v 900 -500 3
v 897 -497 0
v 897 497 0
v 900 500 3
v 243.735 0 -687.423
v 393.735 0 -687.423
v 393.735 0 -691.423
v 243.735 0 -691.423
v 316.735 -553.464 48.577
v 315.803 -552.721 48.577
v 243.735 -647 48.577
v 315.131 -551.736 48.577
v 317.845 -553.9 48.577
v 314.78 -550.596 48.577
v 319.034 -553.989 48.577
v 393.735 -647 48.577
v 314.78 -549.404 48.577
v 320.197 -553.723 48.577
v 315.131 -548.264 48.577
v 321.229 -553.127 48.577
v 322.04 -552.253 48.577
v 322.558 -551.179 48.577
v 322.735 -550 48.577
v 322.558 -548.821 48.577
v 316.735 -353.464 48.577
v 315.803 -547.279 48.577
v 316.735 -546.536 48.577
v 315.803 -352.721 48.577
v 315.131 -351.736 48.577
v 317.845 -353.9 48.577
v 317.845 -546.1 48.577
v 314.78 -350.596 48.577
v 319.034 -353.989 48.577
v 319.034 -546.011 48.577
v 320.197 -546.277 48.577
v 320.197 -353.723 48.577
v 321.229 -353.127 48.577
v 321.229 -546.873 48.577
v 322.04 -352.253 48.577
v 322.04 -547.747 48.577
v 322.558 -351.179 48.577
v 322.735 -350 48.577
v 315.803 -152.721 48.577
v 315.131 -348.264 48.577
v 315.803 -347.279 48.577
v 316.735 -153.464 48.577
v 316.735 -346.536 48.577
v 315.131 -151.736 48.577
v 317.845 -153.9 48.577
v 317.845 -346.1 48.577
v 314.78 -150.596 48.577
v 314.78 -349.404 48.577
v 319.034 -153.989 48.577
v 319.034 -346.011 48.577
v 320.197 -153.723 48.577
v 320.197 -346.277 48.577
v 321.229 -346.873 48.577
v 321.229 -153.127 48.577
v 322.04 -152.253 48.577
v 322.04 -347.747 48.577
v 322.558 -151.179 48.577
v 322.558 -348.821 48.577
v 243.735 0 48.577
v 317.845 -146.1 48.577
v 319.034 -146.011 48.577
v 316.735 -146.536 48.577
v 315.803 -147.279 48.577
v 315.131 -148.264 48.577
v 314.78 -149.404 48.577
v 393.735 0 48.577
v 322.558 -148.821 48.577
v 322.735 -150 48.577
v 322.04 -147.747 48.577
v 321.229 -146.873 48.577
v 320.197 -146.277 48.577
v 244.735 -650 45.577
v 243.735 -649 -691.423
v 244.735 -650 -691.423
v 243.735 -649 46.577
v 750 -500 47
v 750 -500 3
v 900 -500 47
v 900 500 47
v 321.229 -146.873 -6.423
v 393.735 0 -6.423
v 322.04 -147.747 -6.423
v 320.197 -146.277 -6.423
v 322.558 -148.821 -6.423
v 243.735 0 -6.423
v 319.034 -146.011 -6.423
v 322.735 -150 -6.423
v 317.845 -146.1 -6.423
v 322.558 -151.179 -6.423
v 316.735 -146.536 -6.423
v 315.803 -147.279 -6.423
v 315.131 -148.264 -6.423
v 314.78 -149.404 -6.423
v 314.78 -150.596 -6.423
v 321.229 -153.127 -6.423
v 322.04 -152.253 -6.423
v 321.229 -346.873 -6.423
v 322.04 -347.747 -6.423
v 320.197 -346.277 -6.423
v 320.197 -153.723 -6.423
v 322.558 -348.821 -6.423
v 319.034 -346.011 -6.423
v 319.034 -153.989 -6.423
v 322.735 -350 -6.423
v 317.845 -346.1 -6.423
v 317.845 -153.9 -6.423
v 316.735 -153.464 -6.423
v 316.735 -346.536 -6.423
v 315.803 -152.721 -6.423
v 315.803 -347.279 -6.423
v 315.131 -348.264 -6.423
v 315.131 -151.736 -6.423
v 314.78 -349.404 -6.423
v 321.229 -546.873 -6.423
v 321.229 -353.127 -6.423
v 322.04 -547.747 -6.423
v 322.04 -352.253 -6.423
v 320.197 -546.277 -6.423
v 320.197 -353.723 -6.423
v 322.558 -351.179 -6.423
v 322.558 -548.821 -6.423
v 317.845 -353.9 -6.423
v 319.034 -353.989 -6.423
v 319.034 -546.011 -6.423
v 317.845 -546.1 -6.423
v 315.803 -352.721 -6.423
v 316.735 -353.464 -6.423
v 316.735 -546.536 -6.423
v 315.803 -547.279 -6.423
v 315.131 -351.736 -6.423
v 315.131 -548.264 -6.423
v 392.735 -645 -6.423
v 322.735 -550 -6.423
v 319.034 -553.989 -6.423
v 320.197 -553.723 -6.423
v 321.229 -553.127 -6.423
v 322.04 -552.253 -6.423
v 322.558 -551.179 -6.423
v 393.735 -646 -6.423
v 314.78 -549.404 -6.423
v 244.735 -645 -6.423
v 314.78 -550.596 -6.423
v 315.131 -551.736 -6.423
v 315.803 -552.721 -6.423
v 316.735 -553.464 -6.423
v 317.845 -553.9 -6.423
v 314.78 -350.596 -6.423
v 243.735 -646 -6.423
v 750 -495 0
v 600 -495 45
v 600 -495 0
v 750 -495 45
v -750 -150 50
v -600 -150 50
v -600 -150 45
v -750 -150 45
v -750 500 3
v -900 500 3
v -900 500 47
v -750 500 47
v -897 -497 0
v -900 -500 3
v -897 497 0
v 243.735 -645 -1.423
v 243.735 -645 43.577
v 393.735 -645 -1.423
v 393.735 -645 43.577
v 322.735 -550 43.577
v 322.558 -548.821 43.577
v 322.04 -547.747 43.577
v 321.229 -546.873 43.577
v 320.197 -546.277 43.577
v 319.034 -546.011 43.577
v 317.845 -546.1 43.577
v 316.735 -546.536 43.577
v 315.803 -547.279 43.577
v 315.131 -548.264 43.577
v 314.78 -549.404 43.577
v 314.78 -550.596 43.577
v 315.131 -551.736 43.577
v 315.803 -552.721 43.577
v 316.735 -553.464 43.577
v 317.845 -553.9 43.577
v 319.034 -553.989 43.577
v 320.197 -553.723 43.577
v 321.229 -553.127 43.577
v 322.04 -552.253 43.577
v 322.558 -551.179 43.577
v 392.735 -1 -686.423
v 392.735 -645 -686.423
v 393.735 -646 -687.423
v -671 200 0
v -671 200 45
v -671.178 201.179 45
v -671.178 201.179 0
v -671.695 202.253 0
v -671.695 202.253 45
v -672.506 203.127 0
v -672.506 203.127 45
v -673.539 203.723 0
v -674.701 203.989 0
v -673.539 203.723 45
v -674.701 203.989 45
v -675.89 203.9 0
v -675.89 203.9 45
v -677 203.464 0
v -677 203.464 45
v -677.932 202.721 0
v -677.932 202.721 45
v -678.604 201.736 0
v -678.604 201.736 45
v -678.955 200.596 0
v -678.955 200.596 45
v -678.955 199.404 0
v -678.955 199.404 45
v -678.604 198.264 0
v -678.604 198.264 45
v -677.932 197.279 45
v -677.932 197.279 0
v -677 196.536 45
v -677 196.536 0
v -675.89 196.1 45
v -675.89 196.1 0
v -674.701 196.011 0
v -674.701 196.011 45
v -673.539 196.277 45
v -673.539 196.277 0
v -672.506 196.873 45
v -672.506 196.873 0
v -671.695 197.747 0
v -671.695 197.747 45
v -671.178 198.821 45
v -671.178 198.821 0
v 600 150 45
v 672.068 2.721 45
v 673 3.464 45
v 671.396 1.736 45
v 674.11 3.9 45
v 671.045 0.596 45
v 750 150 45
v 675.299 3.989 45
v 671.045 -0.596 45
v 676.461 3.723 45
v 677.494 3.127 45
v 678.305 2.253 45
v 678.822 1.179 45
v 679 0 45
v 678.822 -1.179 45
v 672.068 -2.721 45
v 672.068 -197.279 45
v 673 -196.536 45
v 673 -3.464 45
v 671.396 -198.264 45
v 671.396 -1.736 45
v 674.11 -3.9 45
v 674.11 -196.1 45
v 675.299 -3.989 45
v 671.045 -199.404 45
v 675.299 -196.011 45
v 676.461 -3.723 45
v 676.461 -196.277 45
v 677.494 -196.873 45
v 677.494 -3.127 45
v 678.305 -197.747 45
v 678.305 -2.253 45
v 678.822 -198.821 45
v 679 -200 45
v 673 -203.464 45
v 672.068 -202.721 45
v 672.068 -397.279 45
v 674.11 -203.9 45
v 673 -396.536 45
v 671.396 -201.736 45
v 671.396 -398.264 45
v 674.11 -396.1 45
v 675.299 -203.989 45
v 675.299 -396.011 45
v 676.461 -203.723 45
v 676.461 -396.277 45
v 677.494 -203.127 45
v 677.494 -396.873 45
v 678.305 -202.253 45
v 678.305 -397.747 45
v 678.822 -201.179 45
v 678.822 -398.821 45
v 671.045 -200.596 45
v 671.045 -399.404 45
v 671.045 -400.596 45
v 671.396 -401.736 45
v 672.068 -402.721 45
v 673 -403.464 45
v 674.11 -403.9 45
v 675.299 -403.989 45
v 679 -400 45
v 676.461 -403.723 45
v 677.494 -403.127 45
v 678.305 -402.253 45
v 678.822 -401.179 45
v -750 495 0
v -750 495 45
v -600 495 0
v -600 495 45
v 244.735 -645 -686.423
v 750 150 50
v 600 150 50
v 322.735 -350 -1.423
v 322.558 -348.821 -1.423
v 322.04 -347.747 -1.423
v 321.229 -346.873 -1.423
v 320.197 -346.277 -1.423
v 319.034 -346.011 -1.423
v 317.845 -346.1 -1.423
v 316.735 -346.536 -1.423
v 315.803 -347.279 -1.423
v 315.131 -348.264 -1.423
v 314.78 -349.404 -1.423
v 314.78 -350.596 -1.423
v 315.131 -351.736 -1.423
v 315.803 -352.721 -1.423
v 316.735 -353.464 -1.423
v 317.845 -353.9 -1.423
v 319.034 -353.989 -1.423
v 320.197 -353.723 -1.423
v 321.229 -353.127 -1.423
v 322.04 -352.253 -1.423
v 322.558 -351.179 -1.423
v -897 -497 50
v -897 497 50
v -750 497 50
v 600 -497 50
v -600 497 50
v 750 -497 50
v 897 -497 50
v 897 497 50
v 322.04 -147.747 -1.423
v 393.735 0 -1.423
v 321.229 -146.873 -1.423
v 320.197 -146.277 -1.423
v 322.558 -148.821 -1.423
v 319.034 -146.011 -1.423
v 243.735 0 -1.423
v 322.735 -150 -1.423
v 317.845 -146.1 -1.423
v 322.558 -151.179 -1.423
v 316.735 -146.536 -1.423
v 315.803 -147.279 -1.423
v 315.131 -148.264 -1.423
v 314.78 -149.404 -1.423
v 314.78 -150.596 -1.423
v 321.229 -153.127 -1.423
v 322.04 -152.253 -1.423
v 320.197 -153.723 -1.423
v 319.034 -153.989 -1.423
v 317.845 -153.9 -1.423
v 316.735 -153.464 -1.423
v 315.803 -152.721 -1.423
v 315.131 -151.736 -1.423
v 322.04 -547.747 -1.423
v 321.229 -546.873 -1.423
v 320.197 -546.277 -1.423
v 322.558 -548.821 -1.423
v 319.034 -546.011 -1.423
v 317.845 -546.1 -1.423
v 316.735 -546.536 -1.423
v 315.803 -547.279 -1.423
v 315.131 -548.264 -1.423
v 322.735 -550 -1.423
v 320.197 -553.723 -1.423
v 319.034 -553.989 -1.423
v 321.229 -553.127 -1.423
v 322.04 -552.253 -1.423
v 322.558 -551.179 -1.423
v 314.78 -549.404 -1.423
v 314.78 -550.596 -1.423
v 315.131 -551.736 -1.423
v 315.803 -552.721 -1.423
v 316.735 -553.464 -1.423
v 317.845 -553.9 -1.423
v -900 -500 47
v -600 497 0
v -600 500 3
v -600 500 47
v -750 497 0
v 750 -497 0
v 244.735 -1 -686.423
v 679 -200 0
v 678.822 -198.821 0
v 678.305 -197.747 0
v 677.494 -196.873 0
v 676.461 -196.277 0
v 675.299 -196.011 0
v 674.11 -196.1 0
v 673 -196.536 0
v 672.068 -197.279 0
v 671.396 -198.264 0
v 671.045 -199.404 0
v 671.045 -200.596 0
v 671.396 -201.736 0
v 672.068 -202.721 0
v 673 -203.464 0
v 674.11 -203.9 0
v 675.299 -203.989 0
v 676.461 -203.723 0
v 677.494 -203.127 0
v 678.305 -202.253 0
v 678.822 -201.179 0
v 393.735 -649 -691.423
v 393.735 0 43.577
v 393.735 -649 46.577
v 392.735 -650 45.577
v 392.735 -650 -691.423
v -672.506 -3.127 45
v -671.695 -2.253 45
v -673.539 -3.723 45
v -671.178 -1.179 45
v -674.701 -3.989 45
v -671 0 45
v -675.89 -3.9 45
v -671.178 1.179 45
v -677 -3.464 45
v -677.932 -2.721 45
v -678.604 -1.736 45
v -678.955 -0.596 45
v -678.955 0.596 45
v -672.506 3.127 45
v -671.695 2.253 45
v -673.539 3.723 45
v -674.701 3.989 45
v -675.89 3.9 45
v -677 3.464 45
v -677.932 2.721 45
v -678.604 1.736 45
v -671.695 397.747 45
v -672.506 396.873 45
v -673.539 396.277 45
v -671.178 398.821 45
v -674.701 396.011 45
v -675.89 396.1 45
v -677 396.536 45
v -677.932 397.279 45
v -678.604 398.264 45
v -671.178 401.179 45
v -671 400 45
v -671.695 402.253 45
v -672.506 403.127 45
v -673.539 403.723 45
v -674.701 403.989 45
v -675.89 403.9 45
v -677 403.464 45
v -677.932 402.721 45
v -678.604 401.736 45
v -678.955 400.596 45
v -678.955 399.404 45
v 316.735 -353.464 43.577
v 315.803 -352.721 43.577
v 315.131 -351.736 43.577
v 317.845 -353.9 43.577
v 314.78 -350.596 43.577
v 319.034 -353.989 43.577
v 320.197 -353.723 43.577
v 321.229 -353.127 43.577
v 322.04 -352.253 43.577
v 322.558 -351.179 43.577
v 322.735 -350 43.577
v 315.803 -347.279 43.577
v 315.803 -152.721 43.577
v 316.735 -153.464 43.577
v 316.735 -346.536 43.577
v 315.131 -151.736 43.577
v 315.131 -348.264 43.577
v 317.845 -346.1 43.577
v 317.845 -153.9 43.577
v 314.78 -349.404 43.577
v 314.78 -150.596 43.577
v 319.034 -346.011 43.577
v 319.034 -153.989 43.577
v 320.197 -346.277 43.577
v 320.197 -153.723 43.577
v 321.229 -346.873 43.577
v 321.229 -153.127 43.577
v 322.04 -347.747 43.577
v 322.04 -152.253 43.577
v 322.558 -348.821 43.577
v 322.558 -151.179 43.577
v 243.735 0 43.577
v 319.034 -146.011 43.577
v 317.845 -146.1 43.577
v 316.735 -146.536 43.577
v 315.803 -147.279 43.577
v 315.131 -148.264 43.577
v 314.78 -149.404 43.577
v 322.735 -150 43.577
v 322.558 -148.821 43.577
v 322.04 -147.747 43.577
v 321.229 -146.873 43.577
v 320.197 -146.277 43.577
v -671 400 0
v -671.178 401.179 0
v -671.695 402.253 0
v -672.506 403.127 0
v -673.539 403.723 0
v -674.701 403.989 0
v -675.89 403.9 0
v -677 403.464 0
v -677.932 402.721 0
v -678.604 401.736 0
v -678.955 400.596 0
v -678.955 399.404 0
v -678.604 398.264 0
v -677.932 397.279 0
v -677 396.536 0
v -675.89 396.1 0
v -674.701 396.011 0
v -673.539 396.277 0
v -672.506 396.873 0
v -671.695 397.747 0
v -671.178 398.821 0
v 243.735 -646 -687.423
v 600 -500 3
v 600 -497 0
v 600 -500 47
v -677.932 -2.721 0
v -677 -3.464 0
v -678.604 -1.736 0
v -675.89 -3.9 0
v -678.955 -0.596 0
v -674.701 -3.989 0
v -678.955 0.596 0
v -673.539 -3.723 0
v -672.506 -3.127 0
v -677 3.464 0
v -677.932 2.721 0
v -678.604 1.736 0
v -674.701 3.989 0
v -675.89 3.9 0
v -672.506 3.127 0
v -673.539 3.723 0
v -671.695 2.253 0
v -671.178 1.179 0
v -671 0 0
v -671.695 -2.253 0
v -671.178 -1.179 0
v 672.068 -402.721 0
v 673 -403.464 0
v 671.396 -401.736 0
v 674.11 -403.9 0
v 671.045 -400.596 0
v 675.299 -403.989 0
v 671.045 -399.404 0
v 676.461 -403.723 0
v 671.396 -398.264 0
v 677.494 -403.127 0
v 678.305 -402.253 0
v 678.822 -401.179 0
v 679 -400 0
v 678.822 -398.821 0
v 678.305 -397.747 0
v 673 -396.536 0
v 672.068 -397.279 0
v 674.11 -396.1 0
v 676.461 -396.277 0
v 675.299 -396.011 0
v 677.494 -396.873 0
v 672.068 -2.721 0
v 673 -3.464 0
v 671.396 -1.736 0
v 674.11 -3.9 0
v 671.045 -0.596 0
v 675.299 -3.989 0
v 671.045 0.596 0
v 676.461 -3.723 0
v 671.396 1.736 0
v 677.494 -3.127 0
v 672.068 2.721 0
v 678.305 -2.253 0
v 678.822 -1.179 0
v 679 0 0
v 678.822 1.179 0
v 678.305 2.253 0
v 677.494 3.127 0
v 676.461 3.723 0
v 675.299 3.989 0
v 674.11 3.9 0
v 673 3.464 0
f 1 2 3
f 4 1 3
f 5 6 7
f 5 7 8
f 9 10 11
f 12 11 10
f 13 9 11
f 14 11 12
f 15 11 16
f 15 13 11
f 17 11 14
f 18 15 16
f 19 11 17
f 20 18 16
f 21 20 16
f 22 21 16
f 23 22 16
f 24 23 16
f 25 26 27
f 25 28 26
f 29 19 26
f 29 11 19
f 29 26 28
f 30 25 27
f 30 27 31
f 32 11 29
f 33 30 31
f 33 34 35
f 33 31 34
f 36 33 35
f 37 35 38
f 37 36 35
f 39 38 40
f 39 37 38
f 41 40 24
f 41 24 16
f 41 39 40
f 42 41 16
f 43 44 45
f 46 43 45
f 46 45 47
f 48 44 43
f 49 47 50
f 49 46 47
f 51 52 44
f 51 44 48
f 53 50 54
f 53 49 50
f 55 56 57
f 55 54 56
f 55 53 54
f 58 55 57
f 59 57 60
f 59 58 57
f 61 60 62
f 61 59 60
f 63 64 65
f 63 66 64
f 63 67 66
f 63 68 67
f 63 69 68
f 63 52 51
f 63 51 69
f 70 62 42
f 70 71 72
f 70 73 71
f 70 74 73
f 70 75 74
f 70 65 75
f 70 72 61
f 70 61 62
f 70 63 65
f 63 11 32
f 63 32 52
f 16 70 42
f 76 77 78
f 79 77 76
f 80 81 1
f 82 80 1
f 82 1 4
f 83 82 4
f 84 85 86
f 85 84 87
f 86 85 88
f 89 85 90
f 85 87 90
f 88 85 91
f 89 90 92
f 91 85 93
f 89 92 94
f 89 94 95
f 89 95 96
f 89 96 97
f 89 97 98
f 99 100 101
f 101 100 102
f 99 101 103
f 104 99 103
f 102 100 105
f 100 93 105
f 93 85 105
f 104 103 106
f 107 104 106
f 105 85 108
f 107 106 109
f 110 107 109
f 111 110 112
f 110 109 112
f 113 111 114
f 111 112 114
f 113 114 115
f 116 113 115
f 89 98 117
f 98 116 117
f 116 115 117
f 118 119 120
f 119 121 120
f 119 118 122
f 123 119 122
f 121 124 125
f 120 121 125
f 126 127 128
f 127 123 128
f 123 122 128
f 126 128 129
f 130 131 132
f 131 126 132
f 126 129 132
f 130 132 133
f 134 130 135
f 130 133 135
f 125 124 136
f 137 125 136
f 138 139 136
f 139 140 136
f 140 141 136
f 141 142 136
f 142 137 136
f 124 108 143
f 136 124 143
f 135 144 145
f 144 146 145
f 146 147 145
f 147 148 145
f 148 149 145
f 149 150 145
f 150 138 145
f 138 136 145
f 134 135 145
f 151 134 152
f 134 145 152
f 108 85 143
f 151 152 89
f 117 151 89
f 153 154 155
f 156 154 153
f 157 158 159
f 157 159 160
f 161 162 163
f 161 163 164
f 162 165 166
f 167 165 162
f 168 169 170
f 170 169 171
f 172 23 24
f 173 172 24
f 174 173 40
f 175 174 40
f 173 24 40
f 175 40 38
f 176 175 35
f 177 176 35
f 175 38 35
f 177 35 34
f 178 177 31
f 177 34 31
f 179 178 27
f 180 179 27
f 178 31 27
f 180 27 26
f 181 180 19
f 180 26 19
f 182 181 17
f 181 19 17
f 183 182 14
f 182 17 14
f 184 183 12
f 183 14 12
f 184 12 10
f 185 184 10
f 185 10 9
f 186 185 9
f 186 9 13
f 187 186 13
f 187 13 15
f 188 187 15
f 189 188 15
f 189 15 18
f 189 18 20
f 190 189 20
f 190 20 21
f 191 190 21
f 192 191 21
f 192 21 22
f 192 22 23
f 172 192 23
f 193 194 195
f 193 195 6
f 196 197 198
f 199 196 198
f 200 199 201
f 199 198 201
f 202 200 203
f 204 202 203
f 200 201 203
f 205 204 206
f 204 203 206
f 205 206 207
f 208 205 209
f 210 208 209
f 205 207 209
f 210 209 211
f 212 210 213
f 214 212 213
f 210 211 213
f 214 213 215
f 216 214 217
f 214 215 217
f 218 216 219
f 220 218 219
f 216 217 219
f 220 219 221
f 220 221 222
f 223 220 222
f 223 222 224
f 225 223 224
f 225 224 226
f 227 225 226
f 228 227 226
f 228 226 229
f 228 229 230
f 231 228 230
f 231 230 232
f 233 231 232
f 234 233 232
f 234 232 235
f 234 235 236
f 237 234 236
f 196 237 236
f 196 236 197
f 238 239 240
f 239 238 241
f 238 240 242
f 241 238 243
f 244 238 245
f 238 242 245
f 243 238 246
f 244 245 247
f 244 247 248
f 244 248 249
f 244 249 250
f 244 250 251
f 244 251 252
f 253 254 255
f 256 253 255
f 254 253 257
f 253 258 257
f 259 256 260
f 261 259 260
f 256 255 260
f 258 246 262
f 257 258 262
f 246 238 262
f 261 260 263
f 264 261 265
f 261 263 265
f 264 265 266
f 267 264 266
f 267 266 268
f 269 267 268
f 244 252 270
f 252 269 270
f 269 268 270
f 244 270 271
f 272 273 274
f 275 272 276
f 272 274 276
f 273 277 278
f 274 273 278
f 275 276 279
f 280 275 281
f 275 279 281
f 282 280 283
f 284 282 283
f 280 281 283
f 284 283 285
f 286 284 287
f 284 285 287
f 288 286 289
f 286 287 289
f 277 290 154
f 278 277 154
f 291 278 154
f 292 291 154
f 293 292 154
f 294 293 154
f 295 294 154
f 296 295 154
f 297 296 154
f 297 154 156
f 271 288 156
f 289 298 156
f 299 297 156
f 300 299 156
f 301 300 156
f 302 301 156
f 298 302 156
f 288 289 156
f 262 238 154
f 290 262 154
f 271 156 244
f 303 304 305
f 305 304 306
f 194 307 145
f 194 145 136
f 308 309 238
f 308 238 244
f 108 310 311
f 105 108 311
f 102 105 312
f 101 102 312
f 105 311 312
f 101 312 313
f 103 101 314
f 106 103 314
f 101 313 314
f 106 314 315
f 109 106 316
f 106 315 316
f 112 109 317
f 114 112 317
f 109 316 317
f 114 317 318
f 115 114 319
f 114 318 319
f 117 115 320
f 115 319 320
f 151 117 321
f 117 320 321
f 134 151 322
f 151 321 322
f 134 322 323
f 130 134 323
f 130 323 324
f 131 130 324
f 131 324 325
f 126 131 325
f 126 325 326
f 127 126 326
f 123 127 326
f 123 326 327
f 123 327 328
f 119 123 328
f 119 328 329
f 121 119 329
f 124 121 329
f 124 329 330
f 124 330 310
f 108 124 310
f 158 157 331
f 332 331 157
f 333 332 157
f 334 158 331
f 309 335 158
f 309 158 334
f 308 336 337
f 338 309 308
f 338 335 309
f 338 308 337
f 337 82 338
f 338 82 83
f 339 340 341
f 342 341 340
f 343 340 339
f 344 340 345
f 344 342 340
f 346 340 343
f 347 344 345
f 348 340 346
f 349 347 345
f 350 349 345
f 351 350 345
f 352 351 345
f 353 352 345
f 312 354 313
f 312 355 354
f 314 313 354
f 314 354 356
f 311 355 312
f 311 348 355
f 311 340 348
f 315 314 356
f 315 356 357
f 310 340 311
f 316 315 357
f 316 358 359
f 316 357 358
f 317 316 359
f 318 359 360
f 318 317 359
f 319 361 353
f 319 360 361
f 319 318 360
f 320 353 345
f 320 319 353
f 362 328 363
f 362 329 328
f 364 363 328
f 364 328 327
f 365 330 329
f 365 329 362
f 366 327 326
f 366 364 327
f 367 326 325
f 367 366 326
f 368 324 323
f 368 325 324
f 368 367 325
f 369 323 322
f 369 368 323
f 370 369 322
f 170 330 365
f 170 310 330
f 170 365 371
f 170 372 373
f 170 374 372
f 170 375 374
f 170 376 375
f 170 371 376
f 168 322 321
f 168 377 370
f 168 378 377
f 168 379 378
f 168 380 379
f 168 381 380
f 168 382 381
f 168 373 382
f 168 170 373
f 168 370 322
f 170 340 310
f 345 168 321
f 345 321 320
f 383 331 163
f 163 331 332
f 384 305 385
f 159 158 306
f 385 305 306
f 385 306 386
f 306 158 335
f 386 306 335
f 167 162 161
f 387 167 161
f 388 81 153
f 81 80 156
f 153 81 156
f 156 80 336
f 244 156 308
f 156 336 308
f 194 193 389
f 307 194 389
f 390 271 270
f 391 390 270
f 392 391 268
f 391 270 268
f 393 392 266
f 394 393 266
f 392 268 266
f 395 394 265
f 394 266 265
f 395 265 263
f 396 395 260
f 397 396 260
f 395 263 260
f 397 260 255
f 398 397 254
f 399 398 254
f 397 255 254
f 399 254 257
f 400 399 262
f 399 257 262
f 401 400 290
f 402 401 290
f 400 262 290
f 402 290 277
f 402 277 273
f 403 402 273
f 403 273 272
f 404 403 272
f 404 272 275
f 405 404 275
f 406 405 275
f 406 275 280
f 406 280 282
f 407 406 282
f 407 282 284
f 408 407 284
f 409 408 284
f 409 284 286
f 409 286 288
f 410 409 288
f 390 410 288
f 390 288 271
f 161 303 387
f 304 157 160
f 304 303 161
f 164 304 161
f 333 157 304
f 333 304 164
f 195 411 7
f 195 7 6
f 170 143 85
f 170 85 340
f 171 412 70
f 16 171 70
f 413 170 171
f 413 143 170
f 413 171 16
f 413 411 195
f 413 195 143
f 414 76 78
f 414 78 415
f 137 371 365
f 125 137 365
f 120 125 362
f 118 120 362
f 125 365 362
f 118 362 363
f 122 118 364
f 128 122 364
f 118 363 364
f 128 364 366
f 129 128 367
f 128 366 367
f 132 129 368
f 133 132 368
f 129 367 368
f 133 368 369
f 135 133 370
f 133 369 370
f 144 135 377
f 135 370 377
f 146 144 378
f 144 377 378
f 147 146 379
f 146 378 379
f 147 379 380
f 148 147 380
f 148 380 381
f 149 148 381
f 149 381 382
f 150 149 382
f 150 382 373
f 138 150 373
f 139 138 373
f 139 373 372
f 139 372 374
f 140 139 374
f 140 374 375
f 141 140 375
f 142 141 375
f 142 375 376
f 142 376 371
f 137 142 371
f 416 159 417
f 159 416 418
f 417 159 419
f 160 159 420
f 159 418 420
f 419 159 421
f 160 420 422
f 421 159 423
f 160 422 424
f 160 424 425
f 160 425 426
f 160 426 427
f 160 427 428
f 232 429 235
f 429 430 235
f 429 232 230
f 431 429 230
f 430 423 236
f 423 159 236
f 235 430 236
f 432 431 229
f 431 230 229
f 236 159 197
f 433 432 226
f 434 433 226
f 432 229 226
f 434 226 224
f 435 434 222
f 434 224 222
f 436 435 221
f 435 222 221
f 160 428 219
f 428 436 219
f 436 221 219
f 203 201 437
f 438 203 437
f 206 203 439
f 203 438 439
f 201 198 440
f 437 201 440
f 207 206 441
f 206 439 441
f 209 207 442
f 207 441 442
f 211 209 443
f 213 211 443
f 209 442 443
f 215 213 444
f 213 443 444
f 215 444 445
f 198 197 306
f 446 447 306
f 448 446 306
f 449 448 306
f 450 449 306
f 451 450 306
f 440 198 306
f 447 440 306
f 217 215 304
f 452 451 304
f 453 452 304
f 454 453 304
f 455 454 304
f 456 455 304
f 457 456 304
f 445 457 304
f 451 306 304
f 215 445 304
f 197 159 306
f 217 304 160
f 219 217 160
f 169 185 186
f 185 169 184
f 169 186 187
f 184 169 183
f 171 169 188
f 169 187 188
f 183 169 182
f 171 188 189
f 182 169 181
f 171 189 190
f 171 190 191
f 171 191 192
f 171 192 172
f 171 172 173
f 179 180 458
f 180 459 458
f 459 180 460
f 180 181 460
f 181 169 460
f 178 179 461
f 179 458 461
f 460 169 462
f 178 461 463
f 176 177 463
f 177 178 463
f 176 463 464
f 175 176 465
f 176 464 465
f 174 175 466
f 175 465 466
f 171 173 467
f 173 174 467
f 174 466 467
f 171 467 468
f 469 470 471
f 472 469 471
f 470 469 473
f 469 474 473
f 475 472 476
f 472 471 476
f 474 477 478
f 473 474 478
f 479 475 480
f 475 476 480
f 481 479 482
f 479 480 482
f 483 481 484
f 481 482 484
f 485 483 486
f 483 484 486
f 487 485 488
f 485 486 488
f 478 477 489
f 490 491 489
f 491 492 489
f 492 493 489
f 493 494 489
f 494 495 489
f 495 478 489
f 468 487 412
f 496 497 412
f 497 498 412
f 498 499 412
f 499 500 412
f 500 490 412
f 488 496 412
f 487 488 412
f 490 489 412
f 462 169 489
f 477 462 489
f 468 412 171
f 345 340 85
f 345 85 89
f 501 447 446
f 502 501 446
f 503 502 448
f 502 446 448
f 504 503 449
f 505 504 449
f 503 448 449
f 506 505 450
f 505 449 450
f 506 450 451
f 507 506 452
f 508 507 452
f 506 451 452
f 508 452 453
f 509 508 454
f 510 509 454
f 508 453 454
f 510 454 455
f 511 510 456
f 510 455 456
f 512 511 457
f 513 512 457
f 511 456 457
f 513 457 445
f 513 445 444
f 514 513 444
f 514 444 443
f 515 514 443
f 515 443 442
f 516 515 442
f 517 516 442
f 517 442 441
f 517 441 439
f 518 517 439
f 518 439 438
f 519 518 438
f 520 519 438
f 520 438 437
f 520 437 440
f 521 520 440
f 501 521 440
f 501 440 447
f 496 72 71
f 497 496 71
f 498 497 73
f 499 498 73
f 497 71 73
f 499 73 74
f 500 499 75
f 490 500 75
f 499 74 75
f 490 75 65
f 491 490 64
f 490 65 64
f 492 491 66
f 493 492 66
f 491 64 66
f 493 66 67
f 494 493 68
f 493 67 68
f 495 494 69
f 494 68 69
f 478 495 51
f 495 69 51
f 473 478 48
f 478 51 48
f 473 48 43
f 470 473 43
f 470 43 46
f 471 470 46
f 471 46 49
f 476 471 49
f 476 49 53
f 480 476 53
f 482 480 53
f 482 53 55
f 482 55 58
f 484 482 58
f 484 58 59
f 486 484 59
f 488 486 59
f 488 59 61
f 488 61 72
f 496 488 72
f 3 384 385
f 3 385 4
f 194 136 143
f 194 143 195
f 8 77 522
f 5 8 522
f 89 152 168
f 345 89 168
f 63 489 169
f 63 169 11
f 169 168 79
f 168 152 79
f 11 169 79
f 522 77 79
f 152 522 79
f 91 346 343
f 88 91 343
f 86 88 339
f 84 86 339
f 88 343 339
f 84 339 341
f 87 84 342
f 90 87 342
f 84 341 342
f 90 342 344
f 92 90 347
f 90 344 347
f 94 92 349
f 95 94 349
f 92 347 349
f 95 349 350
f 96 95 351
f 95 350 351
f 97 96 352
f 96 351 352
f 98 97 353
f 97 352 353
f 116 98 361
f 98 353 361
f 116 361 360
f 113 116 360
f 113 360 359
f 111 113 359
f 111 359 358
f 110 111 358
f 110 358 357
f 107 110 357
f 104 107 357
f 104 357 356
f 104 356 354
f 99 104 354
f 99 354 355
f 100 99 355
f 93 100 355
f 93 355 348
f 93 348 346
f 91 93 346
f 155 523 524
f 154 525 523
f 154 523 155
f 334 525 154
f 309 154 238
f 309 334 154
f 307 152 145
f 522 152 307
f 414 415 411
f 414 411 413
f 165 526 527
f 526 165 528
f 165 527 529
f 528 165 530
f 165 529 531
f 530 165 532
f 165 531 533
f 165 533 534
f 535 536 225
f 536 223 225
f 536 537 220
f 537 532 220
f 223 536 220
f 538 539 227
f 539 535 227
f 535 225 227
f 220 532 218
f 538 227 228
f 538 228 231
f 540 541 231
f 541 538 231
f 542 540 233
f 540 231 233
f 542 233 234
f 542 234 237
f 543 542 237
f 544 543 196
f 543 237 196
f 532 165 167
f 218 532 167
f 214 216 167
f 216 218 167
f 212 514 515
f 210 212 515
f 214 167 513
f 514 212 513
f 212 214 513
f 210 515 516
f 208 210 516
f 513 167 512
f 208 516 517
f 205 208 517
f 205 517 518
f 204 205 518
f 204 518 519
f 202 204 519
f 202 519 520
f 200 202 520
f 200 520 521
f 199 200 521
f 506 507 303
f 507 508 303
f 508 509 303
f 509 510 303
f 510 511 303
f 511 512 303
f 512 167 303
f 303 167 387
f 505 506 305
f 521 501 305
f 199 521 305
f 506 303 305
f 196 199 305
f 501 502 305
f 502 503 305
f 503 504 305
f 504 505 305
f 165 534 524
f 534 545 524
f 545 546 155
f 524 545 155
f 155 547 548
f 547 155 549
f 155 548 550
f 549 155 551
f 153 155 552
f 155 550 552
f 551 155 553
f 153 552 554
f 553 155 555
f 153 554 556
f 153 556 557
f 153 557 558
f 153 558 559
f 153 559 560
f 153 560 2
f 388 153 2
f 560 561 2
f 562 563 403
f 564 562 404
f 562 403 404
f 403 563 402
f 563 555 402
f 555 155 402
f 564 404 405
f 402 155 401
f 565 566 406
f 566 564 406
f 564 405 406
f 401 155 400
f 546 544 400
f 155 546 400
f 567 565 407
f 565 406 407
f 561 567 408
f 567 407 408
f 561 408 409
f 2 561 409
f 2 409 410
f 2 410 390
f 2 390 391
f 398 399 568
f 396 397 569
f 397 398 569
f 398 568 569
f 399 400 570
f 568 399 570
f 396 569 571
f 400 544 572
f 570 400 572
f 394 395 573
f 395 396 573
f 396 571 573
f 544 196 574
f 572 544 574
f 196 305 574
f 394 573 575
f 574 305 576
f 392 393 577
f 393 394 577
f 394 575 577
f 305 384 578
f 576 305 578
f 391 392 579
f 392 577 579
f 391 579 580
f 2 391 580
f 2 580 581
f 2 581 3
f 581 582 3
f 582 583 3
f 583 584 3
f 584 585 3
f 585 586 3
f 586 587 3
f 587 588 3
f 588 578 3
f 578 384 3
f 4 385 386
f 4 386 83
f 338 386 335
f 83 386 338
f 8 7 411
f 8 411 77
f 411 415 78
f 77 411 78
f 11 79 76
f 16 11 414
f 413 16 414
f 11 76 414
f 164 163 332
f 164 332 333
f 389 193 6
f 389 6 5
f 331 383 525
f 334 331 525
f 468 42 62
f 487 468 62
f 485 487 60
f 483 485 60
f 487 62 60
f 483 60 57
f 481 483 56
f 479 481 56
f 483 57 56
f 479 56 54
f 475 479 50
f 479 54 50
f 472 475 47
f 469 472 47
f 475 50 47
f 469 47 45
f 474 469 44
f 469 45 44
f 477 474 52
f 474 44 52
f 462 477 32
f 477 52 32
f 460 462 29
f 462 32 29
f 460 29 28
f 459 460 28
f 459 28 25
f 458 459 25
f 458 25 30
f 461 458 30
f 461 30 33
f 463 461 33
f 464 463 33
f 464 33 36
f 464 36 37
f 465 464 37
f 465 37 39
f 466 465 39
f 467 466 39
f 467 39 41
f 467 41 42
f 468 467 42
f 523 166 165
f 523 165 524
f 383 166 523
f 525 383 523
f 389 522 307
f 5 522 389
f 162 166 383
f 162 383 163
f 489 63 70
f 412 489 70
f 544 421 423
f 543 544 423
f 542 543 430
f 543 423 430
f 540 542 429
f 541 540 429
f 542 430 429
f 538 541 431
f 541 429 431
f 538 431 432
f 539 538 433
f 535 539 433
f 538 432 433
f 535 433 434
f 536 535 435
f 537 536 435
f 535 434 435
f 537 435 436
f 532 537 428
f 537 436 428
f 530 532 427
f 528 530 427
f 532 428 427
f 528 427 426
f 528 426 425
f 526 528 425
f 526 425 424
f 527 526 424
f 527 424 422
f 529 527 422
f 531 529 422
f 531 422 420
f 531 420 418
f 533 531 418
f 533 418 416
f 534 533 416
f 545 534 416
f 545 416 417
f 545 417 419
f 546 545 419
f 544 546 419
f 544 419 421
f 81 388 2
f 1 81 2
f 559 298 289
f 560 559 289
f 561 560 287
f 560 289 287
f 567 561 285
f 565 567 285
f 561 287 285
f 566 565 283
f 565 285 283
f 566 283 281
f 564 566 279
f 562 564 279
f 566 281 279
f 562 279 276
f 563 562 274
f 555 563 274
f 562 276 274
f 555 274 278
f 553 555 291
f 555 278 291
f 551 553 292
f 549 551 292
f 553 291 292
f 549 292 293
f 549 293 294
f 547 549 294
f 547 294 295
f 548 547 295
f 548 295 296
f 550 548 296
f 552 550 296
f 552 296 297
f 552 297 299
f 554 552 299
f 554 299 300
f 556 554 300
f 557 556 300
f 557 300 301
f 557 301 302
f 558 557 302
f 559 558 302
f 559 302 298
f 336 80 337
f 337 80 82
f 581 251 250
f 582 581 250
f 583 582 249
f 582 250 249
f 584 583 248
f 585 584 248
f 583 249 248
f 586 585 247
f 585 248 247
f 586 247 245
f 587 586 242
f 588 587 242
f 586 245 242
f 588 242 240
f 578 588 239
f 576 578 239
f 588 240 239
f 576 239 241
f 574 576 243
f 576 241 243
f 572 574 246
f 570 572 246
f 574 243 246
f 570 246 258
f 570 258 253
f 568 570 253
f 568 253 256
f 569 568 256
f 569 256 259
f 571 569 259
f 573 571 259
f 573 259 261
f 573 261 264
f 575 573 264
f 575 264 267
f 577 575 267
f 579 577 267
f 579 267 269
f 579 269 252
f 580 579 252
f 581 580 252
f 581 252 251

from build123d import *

# Parameters (mm, degrees)
F0_W      = 1800
F0_H      = 1000
F1_DEPTH  = 50
F2_W      = 150
F2_H      = 10
F3_DEPTH  = 650
F4_W      = 150
F4_H      = 5
F5_DEPTH  = 650
F6_R      = 4
F7_DEPTH  = 50
F8_W      = 150
F8_H      = 5
F9_DEPTH  = 650
F10_W     = 150
F10_H     = 5
F11_DEPTH = 735
F12_W     = 150
F12_H     = 5
F13_DEPTH = 645
F14_W     = 150
F14_H     = 5
F15_DEPTH = 645
F16_R     = 4
F17_DEPTH = 80
F18_W     = 150
F18_H     = 5
F19_DEPTH = 100
F20_W     = 150
F20_H     = 5
F21_DEPTH = 100
F22_SIZE  = 3
F23_SIZE  = 3
F24_SIZE  = 1


with BuildPart() as f1:
    # F0 (on Top) → F1 (new body)
    with BuildSketch(Plane.XY):
        Rectangle(F0_W, F0_H)
    extrude(amount=F1_DEPTH)

    # F2 (on face) → F3 (cut)
    with BuildSketch(Plane.XZ.offset(500)):
        with Locations((675, 50)):
            Rectangle(F2_W, F2_H)
    extrude(amount=-F3_DEPTH, mode=Mode.SUBTRACT)

    # F4 (on face) → F5 (cut)
    with BuildSketch(Plane(origin=(0, 500, 0), x_dir=(-1, 0, 0), z_dir=(0, 1, 0))):
        with Locations((675, 47.5)):
            Rectangle(F4_W, F4_H)
    extrude(amount=-F5_DEPTH, mode=Mode.SUBTRACT)

    # F6 (on face) → F7 (cut)
    with BuildSketch(Plane.XY.offset(45)):
        with Locations((675, 0)):
            Circle(F6_R)
        with Locations((675, -200)):
            Circle(F6_R)
        with Locations((675, -400)):
            Circle(F6_R)
        with Locations((-675, 400)):
            Circle(F6_R)
        with Locations((-675, 200)):
            Circle(F6_R)
        with Locations((-675, 0)):
            Circle(F6_R)
    extrude(amount=-F7_DEPTH, mode=Mode.SUBTRACT)

    # F18 (on face) → F19 (cut)
    with BuildSketch(Plane.XY.offset(45)):
        with Locations((675, -497.5)):
            Rectangle(F18_W, F18_H)
    extrude(amount=-F19_DEPTH, mode=Mode.SUBTRACT)

    # F20 (on face) → F21 (cut)
    with BuildSketch(Plane.XY.offset(45)):
        with Locations((-675, 497.5)):
            Rectangle(F20_W, F20_H)
    extrude(amount=-F21_DEPTH, mode=Mode.SUBTRACT)

    # F22
    f22_edges = [f1.edges().sort_by_distance(p)[0] for p in [
        (150, 500, 50),
        (-825, 500, 50),
        (-900, 0, 50),
        (-150, -500, 50),
        (825, -500, 50),
        (825, -500, 0),
        (-150, -500, 0),
        (-900, 0, 0),
        (-825, 500, 0),
        (150, 500, 0),
        (900, 0, 50),
        (900, 0, 0),
    ]]
    chamfer(f22_edges, length=F22_SIZE)


with BuildPart() as f9:
    # F8 (on Front) → F9 (new body)
    with BuildSketch(Plane.XZ):
        with Locations((318.7353536487, 46.0768144429)):
            Rectangle(F8_W, F8_H)
    extrude(amount=F9_DEPTH)

    # F10 (on face) → F11 (join)
    with BuildSketch(Plane(origin=(0, 0, 43.5768144429), x_dir=(1, 0, 0), z_dir=(0, 0, -1))):
        with Locations((318.7353536487, 647.5)):
            Rectangle(F10_W, F10_H)
    extrude(amount=F11_DEPTH)

    # F12 (on face) → F13 (join)
    with BuildSketch(Plane(origin=(0, -645, 0), x_dir=(-1, 0, 0), z_dir=(0, 1, 0))):
        with Locations((-318.7353536487, -688.9231855571)):
            Rectangle(F12_W, F12_H)
    extrude(amount=F13_DEPTH)

    # F14 (on face) → F15 (join)
    with BuildSketch(Plane(origin=(0, -645, 0), x_dir=(-1, 0, 0), z_dir=(0, 1, 0))):
        with Locations((-318.7353536487, -3.9231855571)):
            Rectangle(F14_W, F14_H)
    extrude(amount=F15_DEPTH)

    # F16 (on face) → F17 (cut)
    with BuildSketch(Plane.XY.offset(48.5768144429)):
        with Locations((318.7353536487, -150)):
            Circle(F16_R)
        with Locations((318.7353536487, -350)):
            Circle(F16_R)
        with Locations((318.7353536487, -550)):
            Circle(F16_R)
    extrude(amount=-F17_DEPTH, mode=Mode.SUBTRACT)

    # F23
    f23_edges = [f9.edges().sort_by_distance(p)[0] for p in [
        (318.735354, -650, 48.576814),
    ]]
    chamfer(f23_edges, length=F23_SIZE)

    # F24
    f24_edges = [f9.edges().sort_by_distance(p)[0] for p in [
        (393.735354, -650, -322.923186),
        (243.735354, -650, -322.923186),
        (243.735354, -645, -346.423186),
        (393.735354, -645, -346.423186),
        (318.735354, 0, -686.423186),
        (393.735354, -322.5, -686.423186),
        (243.735354, -322.5, -686.423186),
    ]]
    chamfer(f24_edges, length=F24_SIZE)


solid = Compound([f1.part, f9.part])
